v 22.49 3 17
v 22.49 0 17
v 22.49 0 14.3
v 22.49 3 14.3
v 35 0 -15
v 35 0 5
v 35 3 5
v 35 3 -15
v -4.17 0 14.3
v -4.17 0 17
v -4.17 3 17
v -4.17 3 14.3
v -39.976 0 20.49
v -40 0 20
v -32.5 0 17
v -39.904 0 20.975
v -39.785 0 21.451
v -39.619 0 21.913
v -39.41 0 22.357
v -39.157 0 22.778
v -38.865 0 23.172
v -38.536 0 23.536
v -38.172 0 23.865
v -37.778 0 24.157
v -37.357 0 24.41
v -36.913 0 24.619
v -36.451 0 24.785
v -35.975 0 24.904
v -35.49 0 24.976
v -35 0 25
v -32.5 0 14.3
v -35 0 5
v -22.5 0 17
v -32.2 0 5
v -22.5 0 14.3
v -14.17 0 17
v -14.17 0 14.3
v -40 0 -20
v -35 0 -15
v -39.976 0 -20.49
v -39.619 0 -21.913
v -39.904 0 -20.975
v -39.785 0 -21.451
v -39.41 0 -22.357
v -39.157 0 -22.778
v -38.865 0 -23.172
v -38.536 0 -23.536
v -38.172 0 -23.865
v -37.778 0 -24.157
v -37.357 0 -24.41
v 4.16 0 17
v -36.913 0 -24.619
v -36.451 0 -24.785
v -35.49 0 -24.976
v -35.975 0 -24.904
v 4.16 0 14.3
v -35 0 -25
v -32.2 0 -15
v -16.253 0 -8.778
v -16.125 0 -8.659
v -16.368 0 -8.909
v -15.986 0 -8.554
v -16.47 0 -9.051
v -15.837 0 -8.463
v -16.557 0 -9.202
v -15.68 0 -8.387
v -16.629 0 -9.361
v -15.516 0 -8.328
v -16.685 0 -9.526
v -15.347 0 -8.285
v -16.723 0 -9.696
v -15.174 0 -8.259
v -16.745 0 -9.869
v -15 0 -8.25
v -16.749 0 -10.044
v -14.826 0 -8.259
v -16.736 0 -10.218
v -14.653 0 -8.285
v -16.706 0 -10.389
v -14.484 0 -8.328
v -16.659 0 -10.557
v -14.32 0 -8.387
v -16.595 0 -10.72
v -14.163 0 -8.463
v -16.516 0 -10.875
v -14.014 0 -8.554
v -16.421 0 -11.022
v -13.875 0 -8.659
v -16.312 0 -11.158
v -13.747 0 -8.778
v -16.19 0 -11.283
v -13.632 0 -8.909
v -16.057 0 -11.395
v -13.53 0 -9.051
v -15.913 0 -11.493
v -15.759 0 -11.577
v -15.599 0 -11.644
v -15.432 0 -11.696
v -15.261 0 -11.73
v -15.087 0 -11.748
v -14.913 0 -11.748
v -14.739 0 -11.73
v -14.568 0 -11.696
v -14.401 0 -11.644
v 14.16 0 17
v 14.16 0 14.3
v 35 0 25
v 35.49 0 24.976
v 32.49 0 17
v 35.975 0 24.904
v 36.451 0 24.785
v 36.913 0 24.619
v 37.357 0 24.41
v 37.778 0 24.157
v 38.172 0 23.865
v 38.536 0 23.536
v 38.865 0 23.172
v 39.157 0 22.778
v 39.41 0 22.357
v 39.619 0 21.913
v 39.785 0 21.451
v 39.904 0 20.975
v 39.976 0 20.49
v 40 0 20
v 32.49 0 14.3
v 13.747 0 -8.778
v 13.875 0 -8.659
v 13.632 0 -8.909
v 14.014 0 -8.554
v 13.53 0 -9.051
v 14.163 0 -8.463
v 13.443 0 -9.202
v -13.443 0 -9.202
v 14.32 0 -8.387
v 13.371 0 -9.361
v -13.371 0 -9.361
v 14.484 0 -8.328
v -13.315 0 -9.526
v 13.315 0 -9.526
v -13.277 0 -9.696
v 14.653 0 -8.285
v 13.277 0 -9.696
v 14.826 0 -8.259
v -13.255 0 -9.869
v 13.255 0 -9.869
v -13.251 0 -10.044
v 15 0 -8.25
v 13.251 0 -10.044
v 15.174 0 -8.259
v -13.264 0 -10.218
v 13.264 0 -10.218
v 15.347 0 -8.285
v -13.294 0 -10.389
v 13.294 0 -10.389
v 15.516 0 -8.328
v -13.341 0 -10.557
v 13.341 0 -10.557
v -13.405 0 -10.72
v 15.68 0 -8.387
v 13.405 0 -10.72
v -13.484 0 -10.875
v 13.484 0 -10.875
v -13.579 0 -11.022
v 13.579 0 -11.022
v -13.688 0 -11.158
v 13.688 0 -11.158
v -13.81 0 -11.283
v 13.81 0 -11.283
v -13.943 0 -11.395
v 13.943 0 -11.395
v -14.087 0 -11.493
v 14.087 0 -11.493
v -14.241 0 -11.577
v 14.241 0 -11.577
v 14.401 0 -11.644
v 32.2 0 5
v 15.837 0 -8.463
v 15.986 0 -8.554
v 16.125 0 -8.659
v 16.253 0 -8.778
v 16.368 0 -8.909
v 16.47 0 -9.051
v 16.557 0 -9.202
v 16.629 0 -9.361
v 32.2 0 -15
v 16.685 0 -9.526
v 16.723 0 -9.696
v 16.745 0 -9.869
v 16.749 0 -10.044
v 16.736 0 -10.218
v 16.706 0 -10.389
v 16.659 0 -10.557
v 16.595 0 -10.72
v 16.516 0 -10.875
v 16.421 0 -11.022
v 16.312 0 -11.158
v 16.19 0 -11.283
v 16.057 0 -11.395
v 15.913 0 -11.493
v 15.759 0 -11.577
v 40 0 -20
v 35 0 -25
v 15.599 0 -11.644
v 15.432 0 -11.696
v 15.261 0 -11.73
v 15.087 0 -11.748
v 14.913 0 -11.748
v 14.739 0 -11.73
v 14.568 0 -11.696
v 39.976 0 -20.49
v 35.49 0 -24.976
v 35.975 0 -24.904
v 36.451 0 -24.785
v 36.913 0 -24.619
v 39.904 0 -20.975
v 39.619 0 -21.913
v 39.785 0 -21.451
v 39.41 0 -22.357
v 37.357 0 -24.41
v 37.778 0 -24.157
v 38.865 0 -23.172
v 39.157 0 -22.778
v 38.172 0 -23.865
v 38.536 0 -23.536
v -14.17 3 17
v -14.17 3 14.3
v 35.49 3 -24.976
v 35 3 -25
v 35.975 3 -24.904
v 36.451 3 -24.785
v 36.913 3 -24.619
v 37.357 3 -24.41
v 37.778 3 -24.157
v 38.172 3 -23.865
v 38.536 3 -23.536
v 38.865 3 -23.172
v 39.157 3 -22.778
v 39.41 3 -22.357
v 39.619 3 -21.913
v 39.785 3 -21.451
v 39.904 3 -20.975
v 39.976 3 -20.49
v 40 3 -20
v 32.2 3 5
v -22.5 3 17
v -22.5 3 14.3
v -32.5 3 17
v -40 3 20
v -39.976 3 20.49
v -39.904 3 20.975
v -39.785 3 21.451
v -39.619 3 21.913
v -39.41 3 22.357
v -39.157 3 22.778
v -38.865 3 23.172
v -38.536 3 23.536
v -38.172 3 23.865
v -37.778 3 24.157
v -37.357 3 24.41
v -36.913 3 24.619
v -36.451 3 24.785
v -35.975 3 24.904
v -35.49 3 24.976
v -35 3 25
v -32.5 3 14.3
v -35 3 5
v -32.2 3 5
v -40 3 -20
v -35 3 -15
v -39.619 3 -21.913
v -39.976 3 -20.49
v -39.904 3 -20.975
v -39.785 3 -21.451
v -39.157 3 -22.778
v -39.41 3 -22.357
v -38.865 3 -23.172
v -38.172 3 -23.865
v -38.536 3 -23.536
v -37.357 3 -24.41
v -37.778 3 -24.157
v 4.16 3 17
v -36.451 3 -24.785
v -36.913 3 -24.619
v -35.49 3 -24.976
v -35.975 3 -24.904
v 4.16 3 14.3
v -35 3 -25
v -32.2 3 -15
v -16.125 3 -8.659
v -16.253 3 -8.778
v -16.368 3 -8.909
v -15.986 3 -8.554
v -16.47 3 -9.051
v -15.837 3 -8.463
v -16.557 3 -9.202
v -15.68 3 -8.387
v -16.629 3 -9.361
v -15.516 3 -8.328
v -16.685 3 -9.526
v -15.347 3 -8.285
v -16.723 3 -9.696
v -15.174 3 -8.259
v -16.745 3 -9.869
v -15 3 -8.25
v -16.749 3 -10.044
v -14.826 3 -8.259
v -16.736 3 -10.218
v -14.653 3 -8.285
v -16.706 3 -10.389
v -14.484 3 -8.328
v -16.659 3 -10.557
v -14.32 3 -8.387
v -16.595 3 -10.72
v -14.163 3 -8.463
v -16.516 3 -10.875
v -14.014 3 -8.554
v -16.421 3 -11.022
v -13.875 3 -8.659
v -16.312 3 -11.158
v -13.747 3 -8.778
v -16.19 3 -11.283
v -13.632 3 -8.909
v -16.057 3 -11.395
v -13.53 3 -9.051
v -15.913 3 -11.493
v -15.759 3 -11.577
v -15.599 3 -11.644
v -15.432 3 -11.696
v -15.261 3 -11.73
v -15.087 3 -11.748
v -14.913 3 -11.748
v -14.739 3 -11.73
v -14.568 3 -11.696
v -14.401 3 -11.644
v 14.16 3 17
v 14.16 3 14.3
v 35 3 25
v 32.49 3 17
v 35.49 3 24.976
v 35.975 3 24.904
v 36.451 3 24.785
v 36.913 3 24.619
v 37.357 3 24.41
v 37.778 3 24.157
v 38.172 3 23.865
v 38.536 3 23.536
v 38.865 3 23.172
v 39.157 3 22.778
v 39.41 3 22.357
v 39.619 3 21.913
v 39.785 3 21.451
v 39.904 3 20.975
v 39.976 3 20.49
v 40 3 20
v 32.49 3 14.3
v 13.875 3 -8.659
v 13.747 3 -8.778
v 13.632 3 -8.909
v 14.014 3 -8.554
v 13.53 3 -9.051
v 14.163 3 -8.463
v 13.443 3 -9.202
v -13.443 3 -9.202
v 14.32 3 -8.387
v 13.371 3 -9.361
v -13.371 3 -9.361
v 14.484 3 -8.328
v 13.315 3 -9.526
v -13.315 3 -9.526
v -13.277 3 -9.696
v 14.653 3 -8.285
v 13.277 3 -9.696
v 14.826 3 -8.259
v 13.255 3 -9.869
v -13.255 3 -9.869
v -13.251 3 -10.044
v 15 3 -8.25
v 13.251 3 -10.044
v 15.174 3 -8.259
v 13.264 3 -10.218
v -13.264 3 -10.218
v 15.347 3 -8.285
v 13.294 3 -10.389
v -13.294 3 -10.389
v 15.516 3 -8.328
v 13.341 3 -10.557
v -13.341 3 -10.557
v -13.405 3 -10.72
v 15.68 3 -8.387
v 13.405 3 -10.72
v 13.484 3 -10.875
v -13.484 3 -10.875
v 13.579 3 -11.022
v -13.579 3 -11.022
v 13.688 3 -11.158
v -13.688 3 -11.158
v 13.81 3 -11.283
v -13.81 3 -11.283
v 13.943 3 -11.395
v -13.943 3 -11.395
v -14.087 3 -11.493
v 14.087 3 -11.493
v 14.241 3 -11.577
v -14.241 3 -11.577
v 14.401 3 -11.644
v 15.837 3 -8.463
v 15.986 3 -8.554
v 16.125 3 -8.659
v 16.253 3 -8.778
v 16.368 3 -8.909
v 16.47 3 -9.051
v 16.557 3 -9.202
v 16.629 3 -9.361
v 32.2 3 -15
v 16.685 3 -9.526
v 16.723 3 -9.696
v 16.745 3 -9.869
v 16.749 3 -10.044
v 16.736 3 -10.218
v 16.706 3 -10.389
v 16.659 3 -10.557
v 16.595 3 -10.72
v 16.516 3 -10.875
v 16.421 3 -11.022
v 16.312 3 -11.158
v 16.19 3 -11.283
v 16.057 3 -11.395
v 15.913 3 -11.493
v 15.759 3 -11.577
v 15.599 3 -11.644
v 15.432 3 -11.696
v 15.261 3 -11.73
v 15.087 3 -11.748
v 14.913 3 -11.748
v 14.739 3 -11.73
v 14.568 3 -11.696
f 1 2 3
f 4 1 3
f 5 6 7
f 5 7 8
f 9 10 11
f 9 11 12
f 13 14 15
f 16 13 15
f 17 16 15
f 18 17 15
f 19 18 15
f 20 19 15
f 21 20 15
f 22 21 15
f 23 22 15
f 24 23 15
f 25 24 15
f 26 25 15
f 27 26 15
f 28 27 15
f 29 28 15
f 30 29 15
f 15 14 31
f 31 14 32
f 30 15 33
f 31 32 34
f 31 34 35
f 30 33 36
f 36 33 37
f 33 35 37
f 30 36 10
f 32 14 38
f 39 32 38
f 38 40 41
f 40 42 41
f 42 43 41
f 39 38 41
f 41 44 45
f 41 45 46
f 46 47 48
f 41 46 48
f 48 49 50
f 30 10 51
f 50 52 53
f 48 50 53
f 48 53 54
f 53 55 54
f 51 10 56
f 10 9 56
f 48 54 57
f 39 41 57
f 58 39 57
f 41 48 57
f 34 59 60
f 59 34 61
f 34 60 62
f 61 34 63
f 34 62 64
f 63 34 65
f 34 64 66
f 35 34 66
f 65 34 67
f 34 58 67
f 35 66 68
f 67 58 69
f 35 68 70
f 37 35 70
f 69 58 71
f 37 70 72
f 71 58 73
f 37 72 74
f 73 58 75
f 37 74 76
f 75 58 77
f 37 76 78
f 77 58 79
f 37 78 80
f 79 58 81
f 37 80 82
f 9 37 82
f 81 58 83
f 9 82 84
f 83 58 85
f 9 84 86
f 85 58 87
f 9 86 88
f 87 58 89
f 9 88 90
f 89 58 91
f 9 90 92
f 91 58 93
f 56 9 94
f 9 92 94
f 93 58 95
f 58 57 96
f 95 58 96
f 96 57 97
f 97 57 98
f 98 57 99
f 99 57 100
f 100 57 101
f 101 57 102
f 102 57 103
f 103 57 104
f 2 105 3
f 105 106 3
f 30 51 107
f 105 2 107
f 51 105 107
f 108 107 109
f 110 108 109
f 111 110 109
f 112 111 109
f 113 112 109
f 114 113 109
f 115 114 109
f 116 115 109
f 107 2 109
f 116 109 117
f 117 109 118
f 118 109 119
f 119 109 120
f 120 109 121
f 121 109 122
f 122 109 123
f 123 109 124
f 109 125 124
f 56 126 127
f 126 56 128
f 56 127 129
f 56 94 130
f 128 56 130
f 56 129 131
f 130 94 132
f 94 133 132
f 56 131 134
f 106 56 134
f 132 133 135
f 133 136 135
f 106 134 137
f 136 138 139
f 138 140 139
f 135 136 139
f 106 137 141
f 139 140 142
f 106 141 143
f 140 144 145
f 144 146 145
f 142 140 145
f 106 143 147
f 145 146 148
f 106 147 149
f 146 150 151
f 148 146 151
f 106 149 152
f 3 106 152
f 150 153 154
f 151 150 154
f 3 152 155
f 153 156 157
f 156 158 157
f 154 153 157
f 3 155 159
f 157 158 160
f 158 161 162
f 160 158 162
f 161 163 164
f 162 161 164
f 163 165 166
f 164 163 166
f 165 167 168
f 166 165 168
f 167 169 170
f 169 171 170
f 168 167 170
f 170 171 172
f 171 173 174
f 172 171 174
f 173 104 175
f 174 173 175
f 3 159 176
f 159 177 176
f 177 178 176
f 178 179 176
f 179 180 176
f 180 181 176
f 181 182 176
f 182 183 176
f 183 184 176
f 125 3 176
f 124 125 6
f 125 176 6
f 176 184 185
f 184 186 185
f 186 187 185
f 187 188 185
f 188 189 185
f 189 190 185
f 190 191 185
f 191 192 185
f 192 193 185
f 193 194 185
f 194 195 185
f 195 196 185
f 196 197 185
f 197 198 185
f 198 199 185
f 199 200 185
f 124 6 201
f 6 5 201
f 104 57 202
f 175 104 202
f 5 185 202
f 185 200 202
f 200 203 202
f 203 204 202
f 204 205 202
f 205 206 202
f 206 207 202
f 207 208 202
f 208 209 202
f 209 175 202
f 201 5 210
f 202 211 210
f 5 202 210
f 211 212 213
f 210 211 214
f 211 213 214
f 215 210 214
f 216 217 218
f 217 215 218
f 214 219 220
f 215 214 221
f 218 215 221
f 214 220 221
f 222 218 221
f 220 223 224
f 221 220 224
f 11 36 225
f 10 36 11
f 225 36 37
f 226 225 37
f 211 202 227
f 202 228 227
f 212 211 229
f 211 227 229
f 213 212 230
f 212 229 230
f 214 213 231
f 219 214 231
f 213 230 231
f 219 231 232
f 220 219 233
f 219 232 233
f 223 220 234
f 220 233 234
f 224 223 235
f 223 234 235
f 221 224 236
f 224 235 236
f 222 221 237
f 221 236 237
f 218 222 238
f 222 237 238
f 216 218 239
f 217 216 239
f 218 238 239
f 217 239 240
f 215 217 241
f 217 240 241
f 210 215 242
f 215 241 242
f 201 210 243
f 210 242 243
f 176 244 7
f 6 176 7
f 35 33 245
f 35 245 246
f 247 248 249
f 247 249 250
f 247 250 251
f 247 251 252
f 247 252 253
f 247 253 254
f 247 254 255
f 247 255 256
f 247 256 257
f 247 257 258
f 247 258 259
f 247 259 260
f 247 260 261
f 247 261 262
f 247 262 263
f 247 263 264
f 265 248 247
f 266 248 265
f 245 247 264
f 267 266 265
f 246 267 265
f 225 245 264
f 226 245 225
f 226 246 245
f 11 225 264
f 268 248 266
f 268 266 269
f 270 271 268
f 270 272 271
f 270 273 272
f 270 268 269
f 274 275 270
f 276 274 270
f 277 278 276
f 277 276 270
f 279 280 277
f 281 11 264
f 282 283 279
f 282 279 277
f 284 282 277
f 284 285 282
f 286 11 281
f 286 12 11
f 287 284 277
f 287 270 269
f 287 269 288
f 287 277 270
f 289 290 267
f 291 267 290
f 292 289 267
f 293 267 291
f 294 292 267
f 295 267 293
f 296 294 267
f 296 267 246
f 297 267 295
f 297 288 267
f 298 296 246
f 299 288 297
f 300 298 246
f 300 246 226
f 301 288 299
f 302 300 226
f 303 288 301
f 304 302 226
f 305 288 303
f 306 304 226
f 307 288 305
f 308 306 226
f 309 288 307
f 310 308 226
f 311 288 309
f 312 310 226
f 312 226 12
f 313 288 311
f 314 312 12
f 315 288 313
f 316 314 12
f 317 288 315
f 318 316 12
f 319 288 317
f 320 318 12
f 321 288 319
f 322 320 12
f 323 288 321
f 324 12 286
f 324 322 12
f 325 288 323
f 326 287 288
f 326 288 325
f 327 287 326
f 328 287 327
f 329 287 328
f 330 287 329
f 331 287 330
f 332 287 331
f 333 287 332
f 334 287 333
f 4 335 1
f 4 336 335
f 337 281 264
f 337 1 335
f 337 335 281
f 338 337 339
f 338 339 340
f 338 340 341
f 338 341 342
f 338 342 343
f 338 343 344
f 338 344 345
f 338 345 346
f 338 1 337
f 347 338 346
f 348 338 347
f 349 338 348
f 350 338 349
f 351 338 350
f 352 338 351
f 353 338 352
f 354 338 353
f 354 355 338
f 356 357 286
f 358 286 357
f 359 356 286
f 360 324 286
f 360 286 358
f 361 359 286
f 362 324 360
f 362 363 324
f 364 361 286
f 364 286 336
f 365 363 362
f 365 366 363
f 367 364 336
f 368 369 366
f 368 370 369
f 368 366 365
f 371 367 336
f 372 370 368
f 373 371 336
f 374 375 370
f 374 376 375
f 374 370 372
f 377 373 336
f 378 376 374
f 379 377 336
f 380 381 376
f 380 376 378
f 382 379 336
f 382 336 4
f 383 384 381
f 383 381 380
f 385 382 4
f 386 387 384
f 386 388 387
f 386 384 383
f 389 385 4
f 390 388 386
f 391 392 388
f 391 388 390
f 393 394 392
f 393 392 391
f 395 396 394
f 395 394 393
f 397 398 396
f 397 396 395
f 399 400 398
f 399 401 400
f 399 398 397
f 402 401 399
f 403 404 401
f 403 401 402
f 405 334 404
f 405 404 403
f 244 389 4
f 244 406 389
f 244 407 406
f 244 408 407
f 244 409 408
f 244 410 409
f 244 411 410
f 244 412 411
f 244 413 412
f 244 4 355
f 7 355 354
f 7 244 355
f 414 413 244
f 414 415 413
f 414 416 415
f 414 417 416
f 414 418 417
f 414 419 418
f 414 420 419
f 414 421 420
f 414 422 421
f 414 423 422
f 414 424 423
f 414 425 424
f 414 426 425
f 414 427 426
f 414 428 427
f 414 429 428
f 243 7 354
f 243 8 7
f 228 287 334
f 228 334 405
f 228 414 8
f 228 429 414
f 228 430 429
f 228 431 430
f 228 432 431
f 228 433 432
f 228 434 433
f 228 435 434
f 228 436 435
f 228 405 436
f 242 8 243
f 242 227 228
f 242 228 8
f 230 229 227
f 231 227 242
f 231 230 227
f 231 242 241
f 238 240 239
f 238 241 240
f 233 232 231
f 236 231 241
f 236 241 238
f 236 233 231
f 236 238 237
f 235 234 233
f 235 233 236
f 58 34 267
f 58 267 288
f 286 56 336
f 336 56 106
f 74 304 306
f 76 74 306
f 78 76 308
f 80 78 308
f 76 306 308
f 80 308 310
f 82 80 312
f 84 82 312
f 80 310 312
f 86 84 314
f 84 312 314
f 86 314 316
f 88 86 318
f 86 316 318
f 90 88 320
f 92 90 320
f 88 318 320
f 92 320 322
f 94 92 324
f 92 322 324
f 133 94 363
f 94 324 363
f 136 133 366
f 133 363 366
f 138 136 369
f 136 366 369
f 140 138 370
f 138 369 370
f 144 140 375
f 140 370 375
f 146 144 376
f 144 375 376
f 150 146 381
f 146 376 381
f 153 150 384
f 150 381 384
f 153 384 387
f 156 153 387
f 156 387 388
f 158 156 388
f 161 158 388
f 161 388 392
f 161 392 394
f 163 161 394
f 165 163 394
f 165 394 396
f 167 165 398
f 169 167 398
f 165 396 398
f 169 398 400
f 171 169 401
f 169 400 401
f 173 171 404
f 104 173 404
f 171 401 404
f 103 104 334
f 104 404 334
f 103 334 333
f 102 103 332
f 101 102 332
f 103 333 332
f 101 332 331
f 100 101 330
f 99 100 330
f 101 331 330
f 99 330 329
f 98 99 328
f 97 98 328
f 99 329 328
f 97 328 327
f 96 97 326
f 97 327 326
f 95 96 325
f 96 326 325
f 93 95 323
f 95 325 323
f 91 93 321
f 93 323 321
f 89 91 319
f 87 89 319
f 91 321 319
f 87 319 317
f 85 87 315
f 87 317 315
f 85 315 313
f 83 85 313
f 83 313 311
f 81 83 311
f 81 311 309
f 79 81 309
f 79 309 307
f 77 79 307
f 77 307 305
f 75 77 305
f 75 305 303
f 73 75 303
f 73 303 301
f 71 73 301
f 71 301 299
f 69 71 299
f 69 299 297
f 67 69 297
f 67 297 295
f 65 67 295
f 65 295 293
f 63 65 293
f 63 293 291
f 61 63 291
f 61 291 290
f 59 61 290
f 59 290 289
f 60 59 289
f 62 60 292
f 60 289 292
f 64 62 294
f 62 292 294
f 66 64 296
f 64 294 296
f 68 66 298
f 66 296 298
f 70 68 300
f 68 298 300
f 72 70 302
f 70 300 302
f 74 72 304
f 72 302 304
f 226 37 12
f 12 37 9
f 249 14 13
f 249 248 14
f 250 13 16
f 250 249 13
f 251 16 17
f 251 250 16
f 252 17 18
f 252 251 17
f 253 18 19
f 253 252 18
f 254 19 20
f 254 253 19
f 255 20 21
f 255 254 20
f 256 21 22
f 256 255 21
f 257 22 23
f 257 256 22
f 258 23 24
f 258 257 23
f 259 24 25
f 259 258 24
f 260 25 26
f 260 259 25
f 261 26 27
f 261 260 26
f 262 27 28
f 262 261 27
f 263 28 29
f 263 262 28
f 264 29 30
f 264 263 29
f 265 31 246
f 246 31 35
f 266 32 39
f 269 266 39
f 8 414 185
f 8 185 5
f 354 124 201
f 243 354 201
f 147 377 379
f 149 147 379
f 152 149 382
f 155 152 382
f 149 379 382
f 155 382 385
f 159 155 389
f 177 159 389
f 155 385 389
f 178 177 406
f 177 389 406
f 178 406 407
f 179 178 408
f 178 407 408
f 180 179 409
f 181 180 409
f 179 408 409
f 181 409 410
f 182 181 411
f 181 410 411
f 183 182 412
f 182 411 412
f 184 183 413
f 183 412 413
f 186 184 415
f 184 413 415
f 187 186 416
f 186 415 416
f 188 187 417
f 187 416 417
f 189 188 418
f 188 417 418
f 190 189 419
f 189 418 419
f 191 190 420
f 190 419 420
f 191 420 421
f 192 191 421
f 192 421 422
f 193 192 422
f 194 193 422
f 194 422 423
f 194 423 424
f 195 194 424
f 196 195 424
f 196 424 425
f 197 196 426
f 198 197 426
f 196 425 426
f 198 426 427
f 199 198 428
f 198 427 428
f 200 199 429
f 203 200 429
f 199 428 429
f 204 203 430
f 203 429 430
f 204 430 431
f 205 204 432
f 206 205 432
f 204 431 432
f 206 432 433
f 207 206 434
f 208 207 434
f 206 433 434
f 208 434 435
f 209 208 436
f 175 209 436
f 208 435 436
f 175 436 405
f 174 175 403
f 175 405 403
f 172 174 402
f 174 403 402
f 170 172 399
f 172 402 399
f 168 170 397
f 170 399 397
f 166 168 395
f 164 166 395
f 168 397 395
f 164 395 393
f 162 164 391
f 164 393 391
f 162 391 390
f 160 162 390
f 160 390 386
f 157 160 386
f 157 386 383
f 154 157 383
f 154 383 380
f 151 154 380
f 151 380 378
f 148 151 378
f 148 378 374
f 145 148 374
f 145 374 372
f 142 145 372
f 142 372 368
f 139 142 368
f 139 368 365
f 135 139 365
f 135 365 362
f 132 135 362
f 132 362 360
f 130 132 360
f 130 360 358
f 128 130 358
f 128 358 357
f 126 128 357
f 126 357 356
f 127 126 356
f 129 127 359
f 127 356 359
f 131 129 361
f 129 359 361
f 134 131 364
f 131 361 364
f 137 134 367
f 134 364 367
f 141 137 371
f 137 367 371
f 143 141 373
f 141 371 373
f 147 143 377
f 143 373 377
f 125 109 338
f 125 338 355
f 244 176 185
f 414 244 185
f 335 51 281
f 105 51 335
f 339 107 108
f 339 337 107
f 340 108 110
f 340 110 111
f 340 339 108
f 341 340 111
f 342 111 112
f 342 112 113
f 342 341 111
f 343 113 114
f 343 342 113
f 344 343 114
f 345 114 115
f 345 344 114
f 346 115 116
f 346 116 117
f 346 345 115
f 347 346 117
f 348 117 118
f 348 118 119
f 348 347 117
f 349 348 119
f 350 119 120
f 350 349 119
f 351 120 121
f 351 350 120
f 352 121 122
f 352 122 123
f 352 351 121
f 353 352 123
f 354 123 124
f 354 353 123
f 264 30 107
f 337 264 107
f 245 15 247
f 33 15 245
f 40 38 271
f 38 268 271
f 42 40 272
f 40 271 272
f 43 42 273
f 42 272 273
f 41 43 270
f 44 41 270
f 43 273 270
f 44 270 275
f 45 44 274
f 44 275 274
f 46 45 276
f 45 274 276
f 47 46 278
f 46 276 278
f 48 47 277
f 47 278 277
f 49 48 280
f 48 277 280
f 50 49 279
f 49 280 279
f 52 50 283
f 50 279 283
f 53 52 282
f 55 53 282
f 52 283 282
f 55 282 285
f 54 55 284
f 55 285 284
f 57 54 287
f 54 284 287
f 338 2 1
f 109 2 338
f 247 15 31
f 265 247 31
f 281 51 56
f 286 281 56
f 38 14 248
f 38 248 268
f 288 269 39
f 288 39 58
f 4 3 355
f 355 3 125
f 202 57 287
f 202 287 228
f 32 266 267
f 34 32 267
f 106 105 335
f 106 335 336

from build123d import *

# Parameters (mm, degrees)
SKETCH1_W           = 80
SKETCH1_H           = 50
SKETCH1_W_2         = 10
SKETCH1_H_2         = 2.7
SKETCH1_W_3         = 2.8
SKETCH1_H_3         = 20
BOSS_EXTRUDE1_DEPTH = 3
SKETCH2_R           = 1.75
CUT_EXTRUDE1_DEPTH  = 3
FILLET1_R           = 5


with BuildPart() as part:
    # Sketch1 → Boss-Extrude1 (new body)
    with BuildSketch(Plane(origin=(0, 0, 0), x_dir=(1, 0, 0), z_dir=(0, 1, 0))):
        Rectangle(SKETCH1_W, SKETCH1_H)
        with Locations((-9.17, -15.65)):
            Rectangle(SKETCH1_W_2, SKETCH1_H_2, mode=Mode.SUBTRACT)
        with Locations((-27.5, -15.65)):
            Rectangle(SKETCH1_W_2, SKETCH1_H_2, mode=Mode.SUBTRACT)
        with Locations((9.16, -15.65)):
            Rectangle(SKETCH1_W_2, SKETCH1_H_2, mode=Mode.SUBTRACT)
        with Locations((27.49, -15.65)):
            Rectangle(SKETCH1_W_2, SKETCH1_H_2, mode=Mode.SUBTRACT)
        with Locations((-33.6, 5)):
            Rectangle(SKETCH1_W_3, SKETCH1_H_3, mode=Mode.SUBTRACT)
        with Locations((33.6, 5)):
            Rectangle(SKETCH1_W_3, SKETCH1_H_3, mode=Mode.SUBTRACT)
    extrude(amount=BOSS_EXTRUDE1_DEPTH)

    # Sketch2 → Cut-Extrude1 (cut)
    with BuildSketch(Plane(origin=(0, 3, 0), x_dir=(1, 0, 0), z_dir=(0, 1, 0))):
        with Locations(Location((15, 10, 0), (0, 0, 270))):
            Circle(SKETCH2_R)
        with Locations(Location((-15, 10, 0), (0, 0, 270))):
            Circle(SKETCH2_R)
    extrude(amount=-CUT_EXTRUDE1_DEPTH, mode=Mode.SUBTRACT)

    # Fillet1
    fillet1_edges = [part.edges().sort_by_distance(p)[0] for p in [
        (-40, 1.5, -25),
        (40, 1.5, -25),
        (40, 1.5, 25),
        (-40, 1.5, 25),
    ]]
    fillet(fillet1_edges, radius=FILLET1_R)


solid = part.part
